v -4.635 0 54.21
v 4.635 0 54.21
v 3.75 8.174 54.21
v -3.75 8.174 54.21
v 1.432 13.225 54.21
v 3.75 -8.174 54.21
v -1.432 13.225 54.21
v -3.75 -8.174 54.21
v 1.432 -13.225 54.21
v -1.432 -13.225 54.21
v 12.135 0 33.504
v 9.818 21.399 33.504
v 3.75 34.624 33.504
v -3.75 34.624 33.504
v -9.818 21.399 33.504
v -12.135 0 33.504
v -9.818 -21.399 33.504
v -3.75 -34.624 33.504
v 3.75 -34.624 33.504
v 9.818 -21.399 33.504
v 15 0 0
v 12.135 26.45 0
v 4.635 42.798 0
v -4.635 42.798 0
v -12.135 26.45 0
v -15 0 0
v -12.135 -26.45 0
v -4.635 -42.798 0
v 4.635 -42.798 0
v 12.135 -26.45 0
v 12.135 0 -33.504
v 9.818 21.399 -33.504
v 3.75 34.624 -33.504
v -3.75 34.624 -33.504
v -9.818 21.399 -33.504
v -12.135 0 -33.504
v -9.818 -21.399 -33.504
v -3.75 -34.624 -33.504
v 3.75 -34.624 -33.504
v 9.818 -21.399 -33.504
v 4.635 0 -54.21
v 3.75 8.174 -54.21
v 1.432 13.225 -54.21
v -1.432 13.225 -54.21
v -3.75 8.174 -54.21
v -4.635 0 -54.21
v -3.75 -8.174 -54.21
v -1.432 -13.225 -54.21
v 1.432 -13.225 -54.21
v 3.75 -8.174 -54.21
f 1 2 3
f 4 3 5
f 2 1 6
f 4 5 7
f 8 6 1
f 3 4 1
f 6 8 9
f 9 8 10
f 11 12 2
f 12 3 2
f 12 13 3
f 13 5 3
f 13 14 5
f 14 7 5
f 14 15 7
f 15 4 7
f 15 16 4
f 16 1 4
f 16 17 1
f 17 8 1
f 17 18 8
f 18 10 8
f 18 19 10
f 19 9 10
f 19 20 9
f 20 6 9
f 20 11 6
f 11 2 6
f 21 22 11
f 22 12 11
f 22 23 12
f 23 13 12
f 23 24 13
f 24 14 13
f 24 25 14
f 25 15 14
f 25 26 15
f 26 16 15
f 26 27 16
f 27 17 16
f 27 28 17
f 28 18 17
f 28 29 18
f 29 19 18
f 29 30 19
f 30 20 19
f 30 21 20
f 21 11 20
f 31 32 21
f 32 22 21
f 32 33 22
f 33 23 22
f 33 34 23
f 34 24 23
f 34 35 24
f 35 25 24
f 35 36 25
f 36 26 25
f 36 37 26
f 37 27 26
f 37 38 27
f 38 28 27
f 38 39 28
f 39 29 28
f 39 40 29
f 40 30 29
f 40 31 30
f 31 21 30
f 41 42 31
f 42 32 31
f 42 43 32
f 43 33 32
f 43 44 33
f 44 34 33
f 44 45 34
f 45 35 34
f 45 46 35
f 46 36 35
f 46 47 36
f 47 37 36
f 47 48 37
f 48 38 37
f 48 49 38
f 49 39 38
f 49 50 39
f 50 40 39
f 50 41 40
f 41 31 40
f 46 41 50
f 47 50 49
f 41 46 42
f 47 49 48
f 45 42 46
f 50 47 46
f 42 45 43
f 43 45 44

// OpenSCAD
// Generated by SolidPython 1.0.1 on 2020-07-29 00:46:46


scale(v = [5, 15, 19]) {
	sphere(r = 3);
}
/***********************************************
*********      SolidPython code:      **********
************************************************
 
# import packages: SolidPython
from solid import *
from solid.utils import *
from itertools import chain, combinations, permutations


class Resize:

    def __init__(self, scad_file):
        self.scad_file = scad_file
        #self.scad_file = import_scad(scad_file)
        # cone/cylinder param:
        self.r1 = 0
        self.r2 = 0
        self.h = 0
        # rectangular prism param:
        self.w = 0
        self.l = 0
        # ellipse param:
        self.r = 0

    # import OpenScad code (file name corresponds to shape)


    # classify shape + parameters
    def assign(self, param1, param2, param3):
        if self.scad_file == 'cone.scad':
            self.r1 = param1
            self.r2 = param2
            self.h = param3
        elif self.scad_file == 'cylinder.scad':
            self.r1 = param1
            self.r2 = param2
            self.h = param3
        elif self.scad_file == 'rectangularPrism.scad':
            self.h = param1
            self.l = param2
            self.w = param3
        else:
            self.r = param1
            self.h = param2

    # resize parameters
    def iterate(self):
        x = range(3, 20, 2)
        i = 1
        if self.scad_file == 'cone.scad':
            tempList = list(permutations(x, 2))
            for temp in tempList:
                param1 = temp[0]
                param2 = temp[1]
                filepath = 'produced_scad_files/' + 'cone' + str(param1) + '_' + str(param2) + '_' + '.scad'
                scad_render_to_file(cylinder(h=param1, r1=param2, r2=0), filepath)

        elif self.scad_file == 'cylinder.scad':
            tempList = list(permutations(x, 3))
            for temp in tempList:
                param1 = temp[0]
                param2 = temp[1]
                filepath = 'produced_scad_files/' + 'cylinder' + str(param1) + '_' + str(param2) + '_' + '.scad'
                scad_render_to_file(cylinder(h=param1, r1=param2, r2=param2), filepath)

        elif self.scad_file == 'rectangularPrism.scad':
            tempList = list(permutations(x, 3))
            for temp in tempList:
                param1 = temp[0]
                param2 = temp[1]
                param3 = temp[2]
                filepath = 'produced_scad_files/' + 'rectangularPrism' + str(param1) + '_' + str(param2) + '_' + str(
                    param3) + '.scad'
                scad_render_to_file(cube(size=(param1, param2, param3)), filepath)

        elif self.scad_file == 'ellipse.scad':
            tempList = list(permutations(x, 4))
            for temp in tempList:
                param1 = temp[0]
                param2 = temp[1]
                param3 = temp[2]
                param4 = temp[3]
                filepath = 'produced_scad_files/' + 'ellipse' + str(param1) + '_' + str(param2) + '_' + str(param3) + '_' + str(param4) + '.scad'
                scad_render_to_file(scale([param1, param2, param3])(sphere(r=param4)), filepath)

    def render_to_scadfile(self):
        scad_render_to_file(scad, 'example.scad') 
 
************************************************/
